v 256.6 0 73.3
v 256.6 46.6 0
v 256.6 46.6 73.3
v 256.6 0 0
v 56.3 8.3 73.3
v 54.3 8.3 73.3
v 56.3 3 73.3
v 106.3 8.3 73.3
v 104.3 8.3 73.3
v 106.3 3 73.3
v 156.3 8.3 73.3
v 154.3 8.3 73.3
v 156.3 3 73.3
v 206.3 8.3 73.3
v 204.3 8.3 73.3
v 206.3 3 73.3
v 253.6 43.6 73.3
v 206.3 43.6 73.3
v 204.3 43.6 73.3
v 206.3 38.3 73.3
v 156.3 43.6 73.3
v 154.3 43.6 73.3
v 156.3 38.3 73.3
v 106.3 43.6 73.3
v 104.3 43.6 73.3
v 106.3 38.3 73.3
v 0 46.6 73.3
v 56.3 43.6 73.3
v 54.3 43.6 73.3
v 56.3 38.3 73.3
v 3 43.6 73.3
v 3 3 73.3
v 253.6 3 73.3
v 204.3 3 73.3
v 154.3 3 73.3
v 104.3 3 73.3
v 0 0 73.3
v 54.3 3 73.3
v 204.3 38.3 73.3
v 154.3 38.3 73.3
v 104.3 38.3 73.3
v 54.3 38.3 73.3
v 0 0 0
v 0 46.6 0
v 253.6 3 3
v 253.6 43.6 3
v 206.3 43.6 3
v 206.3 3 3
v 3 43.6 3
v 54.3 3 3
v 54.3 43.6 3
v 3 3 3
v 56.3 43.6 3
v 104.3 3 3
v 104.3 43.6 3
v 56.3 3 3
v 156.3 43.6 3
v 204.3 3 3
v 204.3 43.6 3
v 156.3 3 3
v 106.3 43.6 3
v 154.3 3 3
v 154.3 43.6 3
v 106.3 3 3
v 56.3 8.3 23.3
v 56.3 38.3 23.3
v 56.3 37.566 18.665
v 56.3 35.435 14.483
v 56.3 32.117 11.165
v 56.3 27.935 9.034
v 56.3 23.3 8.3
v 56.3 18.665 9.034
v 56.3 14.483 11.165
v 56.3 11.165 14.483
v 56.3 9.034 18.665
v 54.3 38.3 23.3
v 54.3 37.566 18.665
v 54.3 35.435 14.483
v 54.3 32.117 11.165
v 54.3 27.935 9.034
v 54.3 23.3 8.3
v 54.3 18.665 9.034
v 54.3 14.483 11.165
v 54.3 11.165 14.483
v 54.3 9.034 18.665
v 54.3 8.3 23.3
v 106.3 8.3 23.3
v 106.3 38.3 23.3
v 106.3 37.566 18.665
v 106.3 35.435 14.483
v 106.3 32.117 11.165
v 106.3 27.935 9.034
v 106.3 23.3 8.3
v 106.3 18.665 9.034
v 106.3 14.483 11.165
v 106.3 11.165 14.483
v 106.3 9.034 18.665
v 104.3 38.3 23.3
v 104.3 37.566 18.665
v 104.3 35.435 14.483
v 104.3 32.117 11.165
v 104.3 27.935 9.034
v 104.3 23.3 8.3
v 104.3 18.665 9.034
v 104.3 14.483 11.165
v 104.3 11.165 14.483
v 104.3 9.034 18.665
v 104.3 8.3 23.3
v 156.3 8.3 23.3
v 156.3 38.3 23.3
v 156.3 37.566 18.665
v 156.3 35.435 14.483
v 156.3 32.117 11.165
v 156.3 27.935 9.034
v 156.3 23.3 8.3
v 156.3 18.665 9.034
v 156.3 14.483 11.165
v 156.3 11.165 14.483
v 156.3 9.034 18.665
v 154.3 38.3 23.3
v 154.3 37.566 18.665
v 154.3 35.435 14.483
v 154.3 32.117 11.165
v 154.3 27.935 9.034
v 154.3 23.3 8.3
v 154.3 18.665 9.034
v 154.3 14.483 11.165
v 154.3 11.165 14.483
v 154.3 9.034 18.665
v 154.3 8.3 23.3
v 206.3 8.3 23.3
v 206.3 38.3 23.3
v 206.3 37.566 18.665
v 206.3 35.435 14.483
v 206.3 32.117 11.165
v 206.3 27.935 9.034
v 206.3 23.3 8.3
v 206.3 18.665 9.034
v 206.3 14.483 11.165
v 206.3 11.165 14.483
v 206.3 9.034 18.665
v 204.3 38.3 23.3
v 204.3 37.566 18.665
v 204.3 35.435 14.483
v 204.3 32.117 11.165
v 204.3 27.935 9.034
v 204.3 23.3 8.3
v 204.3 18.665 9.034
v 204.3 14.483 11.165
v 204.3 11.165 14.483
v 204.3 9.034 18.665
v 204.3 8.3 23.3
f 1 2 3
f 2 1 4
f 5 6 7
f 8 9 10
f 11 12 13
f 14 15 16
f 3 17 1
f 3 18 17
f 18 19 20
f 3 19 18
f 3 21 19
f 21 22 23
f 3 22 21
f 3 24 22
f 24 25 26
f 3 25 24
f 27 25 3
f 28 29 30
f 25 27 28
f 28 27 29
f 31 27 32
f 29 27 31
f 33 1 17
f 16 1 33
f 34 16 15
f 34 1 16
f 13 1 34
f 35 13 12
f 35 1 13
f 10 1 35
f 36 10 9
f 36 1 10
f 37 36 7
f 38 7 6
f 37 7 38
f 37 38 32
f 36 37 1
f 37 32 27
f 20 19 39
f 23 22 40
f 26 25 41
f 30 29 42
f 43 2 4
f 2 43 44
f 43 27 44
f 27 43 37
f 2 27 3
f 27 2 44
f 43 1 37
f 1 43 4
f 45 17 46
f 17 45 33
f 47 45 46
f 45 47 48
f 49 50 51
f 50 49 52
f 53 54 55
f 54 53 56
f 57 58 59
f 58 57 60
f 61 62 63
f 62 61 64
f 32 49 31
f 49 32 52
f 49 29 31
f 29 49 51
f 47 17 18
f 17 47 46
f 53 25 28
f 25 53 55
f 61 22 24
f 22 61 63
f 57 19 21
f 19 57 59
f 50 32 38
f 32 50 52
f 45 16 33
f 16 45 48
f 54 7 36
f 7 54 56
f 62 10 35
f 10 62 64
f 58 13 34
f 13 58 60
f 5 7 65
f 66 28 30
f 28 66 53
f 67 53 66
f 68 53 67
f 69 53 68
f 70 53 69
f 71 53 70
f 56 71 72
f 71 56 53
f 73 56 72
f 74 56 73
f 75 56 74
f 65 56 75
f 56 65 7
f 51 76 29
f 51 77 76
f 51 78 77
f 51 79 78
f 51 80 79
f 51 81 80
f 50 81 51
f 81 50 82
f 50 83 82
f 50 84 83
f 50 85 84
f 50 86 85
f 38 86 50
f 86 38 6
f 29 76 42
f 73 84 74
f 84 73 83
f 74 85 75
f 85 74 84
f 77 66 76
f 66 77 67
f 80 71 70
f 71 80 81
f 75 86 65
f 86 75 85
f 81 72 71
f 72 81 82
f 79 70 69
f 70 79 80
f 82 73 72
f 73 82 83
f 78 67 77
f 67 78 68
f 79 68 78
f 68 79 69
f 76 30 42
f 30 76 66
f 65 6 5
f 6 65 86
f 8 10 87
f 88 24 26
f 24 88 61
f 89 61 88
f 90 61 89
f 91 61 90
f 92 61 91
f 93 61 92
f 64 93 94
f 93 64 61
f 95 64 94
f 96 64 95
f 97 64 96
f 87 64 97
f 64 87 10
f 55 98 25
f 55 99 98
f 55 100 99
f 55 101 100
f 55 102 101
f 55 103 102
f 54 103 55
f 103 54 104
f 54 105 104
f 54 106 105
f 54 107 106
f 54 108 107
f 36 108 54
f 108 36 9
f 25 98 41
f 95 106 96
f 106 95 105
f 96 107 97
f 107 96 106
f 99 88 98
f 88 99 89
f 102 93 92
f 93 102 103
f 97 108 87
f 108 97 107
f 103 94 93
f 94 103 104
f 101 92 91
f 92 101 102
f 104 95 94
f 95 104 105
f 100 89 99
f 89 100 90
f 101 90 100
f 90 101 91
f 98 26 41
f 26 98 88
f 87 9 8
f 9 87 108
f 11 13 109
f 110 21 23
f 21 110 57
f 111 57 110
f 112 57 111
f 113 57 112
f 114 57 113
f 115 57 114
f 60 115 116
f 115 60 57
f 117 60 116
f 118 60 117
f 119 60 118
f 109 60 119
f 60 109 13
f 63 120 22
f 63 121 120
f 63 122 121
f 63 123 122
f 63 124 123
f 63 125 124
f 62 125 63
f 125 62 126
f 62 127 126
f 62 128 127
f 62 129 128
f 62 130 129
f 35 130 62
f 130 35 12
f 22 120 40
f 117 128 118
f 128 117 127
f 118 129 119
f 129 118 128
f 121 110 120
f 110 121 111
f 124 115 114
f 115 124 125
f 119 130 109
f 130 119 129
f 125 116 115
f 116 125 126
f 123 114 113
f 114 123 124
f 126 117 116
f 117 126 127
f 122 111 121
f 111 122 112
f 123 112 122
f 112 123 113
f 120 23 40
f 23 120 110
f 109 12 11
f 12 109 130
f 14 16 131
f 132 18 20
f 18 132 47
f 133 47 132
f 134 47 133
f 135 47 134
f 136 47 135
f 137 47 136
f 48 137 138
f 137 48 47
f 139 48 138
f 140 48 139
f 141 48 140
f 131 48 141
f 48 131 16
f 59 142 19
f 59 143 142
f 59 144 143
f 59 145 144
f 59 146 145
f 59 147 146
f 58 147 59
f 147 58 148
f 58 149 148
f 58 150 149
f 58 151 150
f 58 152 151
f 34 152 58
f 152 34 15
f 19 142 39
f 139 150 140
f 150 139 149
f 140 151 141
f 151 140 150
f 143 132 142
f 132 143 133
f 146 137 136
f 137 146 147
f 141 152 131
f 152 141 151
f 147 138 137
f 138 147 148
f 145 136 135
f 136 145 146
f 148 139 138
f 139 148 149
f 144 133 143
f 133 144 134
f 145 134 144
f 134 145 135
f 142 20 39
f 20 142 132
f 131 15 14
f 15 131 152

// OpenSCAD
$fn = 20;

// strength of material
s = 3;
// error induced by printing
e = 0.3;



// width of zip bags
w = 40;
// height of zip bags
h = 70;
// length
l = 250;

// number of divisions
nd = 5;
// division strength
ds = 2;
//division width
dw = 5;

// do not change

dd = l / nd;

//division hole
dh = w-2*dw;

difference() {
cube([l+2*s+2*e,w+2*s+2*e,h+s+e]);
    translate([s,s,s]) cube([l+2*e,w+2*e,h+e]);
}

for(i = [1:1:(nd-1)]) {

    translate([s+e+ (dd*i)+ds/2,s,s]) {
        difference() {
            cube([ds,w+2*e,h+e]);
            translate([0,w/2+e,dh/2+dw+e]) rotate([0,90,0]) cylinder(ds,dh/2,dh/2);
            translate([0,dw+e,dw+dh/2+e]) cube([ds,dh,h]);
        }
    }

}
